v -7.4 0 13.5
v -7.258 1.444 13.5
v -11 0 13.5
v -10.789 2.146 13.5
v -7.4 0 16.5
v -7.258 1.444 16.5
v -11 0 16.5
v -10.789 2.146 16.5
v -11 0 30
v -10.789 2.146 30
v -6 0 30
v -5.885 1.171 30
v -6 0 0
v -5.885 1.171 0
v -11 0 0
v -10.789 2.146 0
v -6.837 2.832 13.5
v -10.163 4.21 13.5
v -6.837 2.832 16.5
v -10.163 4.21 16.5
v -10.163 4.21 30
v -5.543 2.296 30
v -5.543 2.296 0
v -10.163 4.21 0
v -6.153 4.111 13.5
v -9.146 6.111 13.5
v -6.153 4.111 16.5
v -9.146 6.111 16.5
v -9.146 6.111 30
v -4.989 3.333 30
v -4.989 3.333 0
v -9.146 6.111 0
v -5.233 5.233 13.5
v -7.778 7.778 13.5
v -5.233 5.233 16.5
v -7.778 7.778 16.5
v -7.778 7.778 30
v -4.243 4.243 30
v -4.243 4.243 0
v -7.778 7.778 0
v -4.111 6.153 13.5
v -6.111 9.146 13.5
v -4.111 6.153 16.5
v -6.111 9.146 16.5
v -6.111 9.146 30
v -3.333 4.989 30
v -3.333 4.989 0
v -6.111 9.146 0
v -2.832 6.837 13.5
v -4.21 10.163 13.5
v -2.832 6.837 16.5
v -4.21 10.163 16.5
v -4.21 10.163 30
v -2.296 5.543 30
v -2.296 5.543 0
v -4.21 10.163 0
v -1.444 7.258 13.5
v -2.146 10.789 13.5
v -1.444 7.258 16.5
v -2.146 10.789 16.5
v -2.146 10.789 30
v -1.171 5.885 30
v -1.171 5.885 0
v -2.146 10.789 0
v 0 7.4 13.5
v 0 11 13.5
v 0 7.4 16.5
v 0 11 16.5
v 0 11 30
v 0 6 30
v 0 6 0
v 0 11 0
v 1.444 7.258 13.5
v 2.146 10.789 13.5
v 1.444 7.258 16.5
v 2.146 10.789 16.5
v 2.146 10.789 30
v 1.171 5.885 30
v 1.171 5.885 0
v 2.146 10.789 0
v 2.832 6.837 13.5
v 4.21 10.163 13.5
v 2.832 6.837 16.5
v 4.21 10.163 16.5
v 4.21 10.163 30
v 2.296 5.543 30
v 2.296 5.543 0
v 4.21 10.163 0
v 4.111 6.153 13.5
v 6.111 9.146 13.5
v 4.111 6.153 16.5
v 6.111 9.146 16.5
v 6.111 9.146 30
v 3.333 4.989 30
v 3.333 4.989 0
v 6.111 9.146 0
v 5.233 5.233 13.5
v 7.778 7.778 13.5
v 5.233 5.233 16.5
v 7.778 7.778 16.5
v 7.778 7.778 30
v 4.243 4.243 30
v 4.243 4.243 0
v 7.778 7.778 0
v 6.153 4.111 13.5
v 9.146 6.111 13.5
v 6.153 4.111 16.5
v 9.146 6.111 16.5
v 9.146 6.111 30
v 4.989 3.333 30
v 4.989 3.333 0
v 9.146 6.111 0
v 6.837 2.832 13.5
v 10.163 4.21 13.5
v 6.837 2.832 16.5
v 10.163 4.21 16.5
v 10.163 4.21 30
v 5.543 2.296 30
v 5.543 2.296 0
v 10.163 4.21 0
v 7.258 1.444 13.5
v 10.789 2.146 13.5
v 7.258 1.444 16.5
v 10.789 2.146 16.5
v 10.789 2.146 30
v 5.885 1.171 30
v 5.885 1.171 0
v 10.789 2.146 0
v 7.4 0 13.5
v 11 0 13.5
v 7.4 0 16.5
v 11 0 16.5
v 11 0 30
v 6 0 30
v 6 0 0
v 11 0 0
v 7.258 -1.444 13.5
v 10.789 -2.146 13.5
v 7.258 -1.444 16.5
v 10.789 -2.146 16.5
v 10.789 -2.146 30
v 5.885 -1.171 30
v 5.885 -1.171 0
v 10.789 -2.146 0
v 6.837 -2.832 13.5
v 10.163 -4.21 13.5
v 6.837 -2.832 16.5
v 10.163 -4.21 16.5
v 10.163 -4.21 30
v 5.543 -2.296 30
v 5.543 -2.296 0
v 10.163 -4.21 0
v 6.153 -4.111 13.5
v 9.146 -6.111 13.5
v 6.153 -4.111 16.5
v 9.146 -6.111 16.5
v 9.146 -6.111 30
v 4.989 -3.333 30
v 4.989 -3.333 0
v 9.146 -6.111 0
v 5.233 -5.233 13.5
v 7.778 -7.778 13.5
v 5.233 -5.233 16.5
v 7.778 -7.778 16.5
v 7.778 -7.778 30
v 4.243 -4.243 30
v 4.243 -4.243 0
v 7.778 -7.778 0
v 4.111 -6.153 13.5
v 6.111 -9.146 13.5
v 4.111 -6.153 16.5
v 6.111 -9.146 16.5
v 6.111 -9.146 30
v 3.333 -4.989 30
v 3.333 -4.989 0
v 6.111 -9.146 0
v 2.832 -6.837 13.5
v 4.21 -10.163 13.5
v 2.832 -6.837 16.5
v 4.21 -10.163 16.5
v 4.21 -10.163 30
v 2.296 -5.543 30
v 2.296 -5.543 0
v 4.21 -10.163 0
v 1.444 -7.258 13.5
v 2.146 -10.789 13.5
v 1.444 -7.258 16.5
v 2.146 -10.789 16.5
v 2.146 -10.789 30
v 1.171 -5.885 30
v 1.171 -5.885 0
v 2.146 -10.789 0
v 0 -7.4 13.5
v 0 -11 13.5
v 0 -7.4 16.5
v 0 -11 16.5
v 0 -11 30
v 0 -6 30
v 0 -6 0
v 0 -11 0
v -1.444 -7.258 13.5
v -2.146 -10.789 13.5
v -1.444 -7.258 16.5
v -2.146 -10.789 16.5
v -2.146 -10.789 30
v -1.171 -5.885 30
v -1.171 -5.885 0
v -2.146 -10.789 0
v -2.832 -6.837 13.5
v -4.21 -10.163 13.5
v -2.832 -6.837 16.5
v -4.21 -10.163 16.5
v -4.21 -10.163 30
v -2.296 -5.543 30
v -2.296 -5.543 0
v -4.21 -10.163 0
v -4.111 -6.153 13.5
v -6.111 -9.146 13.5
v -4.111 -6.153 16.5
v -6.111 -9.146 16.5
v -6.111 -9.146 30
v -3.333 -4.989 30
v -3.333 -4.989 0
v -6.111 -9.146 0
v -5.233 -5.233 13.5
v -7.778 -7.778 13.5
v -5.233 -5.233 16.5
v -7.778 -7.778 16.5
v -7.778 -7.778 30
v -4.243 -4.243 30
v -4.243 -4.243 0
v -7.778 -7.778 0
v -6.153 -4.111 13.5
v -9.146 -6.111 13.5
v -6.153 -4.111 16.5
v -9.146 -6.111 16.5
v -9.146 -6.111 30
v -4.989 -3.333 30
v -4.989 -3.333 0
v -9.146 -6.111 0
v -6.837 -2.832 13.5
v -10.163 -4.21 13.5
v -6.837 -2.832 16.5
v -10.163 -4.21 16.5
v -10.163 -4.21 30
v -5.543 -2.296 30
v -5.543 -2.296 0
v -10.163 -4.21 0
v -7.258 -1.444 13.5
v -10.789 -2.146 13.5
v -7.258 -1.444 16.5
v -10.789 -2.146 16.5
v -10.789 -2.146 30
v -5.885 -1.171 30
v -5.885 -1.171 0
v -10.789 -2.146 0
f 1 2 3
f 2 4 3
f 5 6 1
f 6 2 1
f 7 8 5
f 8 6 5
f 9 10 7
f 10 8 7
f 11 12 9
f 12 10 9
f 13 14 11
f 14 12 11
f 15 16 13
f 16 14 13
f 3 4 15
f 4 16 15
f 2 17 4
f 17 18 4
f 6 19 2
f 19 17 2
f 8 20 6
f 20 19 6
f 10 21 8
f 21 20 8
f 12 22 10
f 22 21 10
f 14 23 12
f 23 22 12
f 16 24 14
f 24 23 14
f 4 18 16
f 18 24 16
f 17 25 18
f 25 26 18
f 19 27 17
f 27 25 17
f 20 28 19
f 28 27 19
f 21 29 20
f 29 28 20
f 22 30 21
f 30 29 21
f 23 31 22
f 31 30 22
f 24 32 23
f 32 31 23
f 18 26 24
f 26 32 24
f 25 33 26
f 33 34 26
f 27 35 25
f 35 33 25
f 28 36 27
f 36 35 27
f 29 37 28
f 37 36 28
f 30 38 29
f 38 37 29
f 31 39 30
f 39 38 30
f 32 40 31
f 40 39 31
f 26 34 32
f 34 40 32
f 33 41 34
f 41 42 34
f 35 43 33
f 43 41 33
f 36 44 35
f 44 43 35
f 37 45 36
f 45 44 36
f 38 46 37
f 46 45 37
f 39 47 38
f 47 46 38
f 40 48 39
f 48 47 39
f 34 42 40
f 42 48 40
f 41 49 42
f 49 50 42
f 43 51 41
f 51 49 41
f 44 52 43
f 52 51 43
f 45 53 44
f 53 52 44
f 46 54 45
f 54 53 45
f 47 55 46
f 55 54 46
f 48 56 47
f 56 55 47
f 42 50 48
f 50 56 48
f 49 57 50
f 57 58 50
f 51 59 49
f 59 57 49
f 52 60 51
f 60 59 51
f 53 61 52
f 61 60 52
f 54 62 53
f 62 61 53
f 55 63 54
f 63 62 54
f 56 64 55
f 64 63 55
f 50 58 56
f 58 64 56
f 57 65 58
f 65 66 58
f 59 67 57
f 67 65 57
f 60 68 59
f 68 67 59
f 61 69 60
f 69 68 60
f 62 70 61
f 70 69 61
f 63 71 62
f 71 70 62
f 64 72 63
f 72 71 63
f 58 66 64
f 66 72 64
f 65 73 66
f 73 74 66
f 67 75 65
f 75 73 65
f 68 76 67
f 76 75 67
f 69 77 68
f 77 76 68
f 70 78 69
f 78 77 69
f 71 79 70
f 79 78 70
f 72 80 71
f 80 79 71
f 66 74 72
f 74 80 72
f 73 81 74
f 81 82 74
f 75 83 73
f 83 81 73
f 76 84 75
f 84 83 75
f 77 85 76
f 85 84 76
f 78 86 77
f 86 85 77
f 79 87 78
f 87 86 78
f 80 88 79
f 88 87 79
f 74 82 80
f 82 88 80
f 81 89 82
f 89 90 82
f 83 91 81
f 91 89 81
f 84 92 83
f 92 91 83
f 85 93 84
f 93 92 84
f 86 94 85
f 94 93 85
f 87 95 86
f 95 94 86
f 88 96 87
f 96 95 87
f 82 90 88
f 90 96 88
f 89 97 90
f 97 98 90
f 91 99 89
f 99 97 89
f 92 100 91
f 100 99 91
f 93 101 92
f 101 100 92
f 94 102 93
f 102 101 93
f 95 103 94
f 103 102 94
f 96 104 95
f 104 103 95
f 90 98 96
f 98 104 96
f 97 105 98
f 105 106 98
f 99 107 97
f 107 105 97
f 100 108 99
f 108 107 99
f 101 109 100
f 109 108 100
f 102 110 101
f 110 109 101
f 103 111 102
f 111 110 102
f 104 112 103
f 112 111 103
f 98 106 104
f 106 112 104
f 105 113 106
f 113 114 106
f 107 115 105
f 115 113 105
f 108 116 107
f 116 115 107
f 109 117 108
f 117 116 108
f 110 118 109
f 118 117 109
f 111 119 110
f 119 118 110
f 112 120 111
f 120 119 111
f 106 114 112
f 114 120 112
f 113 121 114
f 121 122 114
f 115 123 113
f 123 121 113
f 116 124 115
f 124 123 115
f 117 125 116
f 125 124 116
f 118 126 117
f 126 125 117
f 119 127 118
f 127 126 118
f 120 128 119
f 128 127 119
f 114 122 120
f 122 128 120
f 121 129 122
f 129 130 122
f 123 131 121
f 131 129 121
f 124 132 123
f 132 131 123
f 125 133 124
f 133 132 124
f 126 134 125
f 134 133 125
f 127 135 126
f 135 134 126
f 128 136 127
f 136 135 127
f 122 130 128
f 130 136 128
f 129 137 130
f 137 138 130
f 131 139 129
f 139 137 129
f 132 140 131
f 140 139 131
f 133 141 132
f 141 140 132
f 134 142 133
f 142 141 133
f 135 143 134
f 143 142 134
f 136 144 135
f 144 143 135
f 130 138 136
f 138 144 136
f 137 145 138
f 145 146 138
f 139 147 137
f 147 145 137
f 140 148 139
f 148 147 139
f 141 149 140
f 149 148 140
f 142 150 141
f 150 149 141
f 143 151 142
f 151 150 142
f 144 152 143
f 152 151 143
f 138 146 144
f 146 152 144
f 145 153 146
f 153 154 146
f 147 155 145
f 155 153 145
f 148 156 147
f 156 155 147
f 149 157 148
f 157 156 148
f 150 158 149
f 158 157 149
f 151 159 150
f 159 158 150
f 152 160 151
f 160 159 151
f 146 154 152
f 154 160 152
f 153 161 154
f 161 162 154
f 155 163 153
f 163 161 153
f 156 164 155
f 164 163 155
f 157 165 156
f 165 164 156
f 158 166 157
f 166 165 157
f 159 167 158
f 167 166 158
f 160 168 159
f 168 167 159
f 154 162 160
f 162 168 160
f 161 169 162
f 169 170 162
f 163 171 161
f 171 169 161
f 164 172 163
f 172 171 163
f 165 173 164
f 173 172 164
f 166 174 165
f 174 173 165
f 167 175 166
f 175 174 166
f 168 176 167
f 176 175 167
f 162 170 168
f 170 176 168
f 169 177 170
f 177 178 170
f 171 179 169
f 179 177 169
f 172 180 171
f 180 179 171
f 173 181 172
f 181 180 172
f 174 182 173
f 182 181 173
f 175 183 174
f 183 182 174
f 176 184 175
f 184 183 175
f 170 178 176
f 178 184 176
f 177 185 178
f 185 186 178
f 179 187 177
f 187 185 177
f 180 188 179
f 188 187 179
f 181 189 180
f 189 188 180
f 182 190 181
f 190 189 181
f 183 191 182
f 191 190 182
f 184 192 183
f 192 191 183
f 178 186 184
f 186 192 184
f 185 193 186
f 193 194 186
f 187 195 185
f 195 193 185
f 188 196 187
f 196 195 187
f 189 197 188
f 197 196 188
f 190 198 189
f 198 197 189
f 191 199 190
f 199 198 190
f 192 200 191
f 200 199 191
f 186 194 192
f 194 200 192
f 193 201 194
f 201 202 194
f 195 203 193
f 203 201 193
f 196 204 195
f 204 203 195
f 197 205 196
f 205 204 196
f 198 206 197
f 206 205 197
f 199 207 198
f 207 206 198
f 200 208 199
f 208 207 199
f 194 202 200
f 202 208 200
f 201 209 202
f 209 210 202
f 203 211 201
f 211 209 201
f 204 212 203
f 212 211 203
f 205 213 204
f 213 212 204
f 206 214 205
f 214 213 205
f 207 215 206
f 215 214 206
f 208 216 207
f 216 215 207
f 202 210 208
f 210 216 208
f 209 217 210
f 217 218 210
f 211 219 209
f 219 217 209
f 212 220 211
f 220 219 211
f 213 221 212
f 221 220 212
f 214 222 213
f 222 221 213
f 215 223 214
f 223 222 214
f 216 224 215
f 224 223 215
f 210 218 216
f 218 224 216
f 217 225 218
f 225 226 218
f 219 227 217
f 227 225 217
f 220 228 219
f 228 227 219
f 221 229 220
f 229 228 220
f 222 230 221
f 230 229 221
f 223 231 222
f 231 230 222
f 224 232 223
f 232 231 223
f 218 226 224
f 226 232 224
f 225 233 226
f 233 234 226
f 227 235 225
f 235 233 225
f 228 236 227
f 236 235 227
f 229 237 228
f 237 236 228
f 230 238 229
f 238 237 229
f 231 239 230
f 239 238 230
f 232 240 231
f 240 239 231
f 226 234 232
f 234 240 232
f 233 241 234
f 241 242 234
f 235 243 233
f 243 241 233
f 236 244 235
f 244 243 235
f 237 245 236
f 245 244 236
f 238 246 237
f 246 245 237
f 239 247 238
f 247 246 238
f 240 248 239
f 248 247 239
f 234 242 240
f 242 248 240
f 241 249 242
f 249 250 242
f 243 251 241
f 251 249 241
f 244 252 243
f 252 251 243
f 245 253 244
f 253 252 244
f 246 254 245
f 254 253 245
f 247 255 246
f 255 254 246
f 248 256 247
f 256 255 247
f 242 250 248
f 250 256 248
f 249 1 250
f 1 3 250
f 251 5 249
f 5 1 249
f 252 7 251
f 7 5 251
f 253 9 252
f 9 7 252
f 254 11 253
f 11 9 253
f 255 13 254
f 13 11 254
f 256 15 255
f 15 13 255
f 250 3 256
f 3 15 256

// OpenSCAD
$fn = 32;

// ----------------------------------------------------------------------
// Grooved revolve: plain_grooves, bore R6
// ----------------------------------------------------------------------

// --- parameters (mm) ---
bore_r = 6;               // bore radius
outer_r = 11;             // outer radius of the body
total_h = 30;             // overall height, Z
wall = 5;                 // radial wall thickness
groove_w = 3;             // groove width
groove_d = 3.6;           // groove depth
grooves = 1;              // number of outer grooves
fit_tol = 0.05;           // declared fit tolerance (prompt contract)
free_tol = 0.2;           // declared free tolerance (prompt contract)

bbox_x = 2 * outer_r;  // full diameter
bore_d = 2 * bore_r;  // bore diameter
body_d = 2 * outer_r;  // body diameter
revolve_angle = 360;  // full turn around the Z axis

profile = [[6, 0], [11, 0], [11, 13.5], [7.4, 13.5], [7.4, 16.5], [11, 16.5], [11, 30], [6, 30]];  // primary outline, 8 points, counter clockwise

// --- the one profile operation ---
rotate_extrude(angle = revolve_angle) polygon(points = profile);
